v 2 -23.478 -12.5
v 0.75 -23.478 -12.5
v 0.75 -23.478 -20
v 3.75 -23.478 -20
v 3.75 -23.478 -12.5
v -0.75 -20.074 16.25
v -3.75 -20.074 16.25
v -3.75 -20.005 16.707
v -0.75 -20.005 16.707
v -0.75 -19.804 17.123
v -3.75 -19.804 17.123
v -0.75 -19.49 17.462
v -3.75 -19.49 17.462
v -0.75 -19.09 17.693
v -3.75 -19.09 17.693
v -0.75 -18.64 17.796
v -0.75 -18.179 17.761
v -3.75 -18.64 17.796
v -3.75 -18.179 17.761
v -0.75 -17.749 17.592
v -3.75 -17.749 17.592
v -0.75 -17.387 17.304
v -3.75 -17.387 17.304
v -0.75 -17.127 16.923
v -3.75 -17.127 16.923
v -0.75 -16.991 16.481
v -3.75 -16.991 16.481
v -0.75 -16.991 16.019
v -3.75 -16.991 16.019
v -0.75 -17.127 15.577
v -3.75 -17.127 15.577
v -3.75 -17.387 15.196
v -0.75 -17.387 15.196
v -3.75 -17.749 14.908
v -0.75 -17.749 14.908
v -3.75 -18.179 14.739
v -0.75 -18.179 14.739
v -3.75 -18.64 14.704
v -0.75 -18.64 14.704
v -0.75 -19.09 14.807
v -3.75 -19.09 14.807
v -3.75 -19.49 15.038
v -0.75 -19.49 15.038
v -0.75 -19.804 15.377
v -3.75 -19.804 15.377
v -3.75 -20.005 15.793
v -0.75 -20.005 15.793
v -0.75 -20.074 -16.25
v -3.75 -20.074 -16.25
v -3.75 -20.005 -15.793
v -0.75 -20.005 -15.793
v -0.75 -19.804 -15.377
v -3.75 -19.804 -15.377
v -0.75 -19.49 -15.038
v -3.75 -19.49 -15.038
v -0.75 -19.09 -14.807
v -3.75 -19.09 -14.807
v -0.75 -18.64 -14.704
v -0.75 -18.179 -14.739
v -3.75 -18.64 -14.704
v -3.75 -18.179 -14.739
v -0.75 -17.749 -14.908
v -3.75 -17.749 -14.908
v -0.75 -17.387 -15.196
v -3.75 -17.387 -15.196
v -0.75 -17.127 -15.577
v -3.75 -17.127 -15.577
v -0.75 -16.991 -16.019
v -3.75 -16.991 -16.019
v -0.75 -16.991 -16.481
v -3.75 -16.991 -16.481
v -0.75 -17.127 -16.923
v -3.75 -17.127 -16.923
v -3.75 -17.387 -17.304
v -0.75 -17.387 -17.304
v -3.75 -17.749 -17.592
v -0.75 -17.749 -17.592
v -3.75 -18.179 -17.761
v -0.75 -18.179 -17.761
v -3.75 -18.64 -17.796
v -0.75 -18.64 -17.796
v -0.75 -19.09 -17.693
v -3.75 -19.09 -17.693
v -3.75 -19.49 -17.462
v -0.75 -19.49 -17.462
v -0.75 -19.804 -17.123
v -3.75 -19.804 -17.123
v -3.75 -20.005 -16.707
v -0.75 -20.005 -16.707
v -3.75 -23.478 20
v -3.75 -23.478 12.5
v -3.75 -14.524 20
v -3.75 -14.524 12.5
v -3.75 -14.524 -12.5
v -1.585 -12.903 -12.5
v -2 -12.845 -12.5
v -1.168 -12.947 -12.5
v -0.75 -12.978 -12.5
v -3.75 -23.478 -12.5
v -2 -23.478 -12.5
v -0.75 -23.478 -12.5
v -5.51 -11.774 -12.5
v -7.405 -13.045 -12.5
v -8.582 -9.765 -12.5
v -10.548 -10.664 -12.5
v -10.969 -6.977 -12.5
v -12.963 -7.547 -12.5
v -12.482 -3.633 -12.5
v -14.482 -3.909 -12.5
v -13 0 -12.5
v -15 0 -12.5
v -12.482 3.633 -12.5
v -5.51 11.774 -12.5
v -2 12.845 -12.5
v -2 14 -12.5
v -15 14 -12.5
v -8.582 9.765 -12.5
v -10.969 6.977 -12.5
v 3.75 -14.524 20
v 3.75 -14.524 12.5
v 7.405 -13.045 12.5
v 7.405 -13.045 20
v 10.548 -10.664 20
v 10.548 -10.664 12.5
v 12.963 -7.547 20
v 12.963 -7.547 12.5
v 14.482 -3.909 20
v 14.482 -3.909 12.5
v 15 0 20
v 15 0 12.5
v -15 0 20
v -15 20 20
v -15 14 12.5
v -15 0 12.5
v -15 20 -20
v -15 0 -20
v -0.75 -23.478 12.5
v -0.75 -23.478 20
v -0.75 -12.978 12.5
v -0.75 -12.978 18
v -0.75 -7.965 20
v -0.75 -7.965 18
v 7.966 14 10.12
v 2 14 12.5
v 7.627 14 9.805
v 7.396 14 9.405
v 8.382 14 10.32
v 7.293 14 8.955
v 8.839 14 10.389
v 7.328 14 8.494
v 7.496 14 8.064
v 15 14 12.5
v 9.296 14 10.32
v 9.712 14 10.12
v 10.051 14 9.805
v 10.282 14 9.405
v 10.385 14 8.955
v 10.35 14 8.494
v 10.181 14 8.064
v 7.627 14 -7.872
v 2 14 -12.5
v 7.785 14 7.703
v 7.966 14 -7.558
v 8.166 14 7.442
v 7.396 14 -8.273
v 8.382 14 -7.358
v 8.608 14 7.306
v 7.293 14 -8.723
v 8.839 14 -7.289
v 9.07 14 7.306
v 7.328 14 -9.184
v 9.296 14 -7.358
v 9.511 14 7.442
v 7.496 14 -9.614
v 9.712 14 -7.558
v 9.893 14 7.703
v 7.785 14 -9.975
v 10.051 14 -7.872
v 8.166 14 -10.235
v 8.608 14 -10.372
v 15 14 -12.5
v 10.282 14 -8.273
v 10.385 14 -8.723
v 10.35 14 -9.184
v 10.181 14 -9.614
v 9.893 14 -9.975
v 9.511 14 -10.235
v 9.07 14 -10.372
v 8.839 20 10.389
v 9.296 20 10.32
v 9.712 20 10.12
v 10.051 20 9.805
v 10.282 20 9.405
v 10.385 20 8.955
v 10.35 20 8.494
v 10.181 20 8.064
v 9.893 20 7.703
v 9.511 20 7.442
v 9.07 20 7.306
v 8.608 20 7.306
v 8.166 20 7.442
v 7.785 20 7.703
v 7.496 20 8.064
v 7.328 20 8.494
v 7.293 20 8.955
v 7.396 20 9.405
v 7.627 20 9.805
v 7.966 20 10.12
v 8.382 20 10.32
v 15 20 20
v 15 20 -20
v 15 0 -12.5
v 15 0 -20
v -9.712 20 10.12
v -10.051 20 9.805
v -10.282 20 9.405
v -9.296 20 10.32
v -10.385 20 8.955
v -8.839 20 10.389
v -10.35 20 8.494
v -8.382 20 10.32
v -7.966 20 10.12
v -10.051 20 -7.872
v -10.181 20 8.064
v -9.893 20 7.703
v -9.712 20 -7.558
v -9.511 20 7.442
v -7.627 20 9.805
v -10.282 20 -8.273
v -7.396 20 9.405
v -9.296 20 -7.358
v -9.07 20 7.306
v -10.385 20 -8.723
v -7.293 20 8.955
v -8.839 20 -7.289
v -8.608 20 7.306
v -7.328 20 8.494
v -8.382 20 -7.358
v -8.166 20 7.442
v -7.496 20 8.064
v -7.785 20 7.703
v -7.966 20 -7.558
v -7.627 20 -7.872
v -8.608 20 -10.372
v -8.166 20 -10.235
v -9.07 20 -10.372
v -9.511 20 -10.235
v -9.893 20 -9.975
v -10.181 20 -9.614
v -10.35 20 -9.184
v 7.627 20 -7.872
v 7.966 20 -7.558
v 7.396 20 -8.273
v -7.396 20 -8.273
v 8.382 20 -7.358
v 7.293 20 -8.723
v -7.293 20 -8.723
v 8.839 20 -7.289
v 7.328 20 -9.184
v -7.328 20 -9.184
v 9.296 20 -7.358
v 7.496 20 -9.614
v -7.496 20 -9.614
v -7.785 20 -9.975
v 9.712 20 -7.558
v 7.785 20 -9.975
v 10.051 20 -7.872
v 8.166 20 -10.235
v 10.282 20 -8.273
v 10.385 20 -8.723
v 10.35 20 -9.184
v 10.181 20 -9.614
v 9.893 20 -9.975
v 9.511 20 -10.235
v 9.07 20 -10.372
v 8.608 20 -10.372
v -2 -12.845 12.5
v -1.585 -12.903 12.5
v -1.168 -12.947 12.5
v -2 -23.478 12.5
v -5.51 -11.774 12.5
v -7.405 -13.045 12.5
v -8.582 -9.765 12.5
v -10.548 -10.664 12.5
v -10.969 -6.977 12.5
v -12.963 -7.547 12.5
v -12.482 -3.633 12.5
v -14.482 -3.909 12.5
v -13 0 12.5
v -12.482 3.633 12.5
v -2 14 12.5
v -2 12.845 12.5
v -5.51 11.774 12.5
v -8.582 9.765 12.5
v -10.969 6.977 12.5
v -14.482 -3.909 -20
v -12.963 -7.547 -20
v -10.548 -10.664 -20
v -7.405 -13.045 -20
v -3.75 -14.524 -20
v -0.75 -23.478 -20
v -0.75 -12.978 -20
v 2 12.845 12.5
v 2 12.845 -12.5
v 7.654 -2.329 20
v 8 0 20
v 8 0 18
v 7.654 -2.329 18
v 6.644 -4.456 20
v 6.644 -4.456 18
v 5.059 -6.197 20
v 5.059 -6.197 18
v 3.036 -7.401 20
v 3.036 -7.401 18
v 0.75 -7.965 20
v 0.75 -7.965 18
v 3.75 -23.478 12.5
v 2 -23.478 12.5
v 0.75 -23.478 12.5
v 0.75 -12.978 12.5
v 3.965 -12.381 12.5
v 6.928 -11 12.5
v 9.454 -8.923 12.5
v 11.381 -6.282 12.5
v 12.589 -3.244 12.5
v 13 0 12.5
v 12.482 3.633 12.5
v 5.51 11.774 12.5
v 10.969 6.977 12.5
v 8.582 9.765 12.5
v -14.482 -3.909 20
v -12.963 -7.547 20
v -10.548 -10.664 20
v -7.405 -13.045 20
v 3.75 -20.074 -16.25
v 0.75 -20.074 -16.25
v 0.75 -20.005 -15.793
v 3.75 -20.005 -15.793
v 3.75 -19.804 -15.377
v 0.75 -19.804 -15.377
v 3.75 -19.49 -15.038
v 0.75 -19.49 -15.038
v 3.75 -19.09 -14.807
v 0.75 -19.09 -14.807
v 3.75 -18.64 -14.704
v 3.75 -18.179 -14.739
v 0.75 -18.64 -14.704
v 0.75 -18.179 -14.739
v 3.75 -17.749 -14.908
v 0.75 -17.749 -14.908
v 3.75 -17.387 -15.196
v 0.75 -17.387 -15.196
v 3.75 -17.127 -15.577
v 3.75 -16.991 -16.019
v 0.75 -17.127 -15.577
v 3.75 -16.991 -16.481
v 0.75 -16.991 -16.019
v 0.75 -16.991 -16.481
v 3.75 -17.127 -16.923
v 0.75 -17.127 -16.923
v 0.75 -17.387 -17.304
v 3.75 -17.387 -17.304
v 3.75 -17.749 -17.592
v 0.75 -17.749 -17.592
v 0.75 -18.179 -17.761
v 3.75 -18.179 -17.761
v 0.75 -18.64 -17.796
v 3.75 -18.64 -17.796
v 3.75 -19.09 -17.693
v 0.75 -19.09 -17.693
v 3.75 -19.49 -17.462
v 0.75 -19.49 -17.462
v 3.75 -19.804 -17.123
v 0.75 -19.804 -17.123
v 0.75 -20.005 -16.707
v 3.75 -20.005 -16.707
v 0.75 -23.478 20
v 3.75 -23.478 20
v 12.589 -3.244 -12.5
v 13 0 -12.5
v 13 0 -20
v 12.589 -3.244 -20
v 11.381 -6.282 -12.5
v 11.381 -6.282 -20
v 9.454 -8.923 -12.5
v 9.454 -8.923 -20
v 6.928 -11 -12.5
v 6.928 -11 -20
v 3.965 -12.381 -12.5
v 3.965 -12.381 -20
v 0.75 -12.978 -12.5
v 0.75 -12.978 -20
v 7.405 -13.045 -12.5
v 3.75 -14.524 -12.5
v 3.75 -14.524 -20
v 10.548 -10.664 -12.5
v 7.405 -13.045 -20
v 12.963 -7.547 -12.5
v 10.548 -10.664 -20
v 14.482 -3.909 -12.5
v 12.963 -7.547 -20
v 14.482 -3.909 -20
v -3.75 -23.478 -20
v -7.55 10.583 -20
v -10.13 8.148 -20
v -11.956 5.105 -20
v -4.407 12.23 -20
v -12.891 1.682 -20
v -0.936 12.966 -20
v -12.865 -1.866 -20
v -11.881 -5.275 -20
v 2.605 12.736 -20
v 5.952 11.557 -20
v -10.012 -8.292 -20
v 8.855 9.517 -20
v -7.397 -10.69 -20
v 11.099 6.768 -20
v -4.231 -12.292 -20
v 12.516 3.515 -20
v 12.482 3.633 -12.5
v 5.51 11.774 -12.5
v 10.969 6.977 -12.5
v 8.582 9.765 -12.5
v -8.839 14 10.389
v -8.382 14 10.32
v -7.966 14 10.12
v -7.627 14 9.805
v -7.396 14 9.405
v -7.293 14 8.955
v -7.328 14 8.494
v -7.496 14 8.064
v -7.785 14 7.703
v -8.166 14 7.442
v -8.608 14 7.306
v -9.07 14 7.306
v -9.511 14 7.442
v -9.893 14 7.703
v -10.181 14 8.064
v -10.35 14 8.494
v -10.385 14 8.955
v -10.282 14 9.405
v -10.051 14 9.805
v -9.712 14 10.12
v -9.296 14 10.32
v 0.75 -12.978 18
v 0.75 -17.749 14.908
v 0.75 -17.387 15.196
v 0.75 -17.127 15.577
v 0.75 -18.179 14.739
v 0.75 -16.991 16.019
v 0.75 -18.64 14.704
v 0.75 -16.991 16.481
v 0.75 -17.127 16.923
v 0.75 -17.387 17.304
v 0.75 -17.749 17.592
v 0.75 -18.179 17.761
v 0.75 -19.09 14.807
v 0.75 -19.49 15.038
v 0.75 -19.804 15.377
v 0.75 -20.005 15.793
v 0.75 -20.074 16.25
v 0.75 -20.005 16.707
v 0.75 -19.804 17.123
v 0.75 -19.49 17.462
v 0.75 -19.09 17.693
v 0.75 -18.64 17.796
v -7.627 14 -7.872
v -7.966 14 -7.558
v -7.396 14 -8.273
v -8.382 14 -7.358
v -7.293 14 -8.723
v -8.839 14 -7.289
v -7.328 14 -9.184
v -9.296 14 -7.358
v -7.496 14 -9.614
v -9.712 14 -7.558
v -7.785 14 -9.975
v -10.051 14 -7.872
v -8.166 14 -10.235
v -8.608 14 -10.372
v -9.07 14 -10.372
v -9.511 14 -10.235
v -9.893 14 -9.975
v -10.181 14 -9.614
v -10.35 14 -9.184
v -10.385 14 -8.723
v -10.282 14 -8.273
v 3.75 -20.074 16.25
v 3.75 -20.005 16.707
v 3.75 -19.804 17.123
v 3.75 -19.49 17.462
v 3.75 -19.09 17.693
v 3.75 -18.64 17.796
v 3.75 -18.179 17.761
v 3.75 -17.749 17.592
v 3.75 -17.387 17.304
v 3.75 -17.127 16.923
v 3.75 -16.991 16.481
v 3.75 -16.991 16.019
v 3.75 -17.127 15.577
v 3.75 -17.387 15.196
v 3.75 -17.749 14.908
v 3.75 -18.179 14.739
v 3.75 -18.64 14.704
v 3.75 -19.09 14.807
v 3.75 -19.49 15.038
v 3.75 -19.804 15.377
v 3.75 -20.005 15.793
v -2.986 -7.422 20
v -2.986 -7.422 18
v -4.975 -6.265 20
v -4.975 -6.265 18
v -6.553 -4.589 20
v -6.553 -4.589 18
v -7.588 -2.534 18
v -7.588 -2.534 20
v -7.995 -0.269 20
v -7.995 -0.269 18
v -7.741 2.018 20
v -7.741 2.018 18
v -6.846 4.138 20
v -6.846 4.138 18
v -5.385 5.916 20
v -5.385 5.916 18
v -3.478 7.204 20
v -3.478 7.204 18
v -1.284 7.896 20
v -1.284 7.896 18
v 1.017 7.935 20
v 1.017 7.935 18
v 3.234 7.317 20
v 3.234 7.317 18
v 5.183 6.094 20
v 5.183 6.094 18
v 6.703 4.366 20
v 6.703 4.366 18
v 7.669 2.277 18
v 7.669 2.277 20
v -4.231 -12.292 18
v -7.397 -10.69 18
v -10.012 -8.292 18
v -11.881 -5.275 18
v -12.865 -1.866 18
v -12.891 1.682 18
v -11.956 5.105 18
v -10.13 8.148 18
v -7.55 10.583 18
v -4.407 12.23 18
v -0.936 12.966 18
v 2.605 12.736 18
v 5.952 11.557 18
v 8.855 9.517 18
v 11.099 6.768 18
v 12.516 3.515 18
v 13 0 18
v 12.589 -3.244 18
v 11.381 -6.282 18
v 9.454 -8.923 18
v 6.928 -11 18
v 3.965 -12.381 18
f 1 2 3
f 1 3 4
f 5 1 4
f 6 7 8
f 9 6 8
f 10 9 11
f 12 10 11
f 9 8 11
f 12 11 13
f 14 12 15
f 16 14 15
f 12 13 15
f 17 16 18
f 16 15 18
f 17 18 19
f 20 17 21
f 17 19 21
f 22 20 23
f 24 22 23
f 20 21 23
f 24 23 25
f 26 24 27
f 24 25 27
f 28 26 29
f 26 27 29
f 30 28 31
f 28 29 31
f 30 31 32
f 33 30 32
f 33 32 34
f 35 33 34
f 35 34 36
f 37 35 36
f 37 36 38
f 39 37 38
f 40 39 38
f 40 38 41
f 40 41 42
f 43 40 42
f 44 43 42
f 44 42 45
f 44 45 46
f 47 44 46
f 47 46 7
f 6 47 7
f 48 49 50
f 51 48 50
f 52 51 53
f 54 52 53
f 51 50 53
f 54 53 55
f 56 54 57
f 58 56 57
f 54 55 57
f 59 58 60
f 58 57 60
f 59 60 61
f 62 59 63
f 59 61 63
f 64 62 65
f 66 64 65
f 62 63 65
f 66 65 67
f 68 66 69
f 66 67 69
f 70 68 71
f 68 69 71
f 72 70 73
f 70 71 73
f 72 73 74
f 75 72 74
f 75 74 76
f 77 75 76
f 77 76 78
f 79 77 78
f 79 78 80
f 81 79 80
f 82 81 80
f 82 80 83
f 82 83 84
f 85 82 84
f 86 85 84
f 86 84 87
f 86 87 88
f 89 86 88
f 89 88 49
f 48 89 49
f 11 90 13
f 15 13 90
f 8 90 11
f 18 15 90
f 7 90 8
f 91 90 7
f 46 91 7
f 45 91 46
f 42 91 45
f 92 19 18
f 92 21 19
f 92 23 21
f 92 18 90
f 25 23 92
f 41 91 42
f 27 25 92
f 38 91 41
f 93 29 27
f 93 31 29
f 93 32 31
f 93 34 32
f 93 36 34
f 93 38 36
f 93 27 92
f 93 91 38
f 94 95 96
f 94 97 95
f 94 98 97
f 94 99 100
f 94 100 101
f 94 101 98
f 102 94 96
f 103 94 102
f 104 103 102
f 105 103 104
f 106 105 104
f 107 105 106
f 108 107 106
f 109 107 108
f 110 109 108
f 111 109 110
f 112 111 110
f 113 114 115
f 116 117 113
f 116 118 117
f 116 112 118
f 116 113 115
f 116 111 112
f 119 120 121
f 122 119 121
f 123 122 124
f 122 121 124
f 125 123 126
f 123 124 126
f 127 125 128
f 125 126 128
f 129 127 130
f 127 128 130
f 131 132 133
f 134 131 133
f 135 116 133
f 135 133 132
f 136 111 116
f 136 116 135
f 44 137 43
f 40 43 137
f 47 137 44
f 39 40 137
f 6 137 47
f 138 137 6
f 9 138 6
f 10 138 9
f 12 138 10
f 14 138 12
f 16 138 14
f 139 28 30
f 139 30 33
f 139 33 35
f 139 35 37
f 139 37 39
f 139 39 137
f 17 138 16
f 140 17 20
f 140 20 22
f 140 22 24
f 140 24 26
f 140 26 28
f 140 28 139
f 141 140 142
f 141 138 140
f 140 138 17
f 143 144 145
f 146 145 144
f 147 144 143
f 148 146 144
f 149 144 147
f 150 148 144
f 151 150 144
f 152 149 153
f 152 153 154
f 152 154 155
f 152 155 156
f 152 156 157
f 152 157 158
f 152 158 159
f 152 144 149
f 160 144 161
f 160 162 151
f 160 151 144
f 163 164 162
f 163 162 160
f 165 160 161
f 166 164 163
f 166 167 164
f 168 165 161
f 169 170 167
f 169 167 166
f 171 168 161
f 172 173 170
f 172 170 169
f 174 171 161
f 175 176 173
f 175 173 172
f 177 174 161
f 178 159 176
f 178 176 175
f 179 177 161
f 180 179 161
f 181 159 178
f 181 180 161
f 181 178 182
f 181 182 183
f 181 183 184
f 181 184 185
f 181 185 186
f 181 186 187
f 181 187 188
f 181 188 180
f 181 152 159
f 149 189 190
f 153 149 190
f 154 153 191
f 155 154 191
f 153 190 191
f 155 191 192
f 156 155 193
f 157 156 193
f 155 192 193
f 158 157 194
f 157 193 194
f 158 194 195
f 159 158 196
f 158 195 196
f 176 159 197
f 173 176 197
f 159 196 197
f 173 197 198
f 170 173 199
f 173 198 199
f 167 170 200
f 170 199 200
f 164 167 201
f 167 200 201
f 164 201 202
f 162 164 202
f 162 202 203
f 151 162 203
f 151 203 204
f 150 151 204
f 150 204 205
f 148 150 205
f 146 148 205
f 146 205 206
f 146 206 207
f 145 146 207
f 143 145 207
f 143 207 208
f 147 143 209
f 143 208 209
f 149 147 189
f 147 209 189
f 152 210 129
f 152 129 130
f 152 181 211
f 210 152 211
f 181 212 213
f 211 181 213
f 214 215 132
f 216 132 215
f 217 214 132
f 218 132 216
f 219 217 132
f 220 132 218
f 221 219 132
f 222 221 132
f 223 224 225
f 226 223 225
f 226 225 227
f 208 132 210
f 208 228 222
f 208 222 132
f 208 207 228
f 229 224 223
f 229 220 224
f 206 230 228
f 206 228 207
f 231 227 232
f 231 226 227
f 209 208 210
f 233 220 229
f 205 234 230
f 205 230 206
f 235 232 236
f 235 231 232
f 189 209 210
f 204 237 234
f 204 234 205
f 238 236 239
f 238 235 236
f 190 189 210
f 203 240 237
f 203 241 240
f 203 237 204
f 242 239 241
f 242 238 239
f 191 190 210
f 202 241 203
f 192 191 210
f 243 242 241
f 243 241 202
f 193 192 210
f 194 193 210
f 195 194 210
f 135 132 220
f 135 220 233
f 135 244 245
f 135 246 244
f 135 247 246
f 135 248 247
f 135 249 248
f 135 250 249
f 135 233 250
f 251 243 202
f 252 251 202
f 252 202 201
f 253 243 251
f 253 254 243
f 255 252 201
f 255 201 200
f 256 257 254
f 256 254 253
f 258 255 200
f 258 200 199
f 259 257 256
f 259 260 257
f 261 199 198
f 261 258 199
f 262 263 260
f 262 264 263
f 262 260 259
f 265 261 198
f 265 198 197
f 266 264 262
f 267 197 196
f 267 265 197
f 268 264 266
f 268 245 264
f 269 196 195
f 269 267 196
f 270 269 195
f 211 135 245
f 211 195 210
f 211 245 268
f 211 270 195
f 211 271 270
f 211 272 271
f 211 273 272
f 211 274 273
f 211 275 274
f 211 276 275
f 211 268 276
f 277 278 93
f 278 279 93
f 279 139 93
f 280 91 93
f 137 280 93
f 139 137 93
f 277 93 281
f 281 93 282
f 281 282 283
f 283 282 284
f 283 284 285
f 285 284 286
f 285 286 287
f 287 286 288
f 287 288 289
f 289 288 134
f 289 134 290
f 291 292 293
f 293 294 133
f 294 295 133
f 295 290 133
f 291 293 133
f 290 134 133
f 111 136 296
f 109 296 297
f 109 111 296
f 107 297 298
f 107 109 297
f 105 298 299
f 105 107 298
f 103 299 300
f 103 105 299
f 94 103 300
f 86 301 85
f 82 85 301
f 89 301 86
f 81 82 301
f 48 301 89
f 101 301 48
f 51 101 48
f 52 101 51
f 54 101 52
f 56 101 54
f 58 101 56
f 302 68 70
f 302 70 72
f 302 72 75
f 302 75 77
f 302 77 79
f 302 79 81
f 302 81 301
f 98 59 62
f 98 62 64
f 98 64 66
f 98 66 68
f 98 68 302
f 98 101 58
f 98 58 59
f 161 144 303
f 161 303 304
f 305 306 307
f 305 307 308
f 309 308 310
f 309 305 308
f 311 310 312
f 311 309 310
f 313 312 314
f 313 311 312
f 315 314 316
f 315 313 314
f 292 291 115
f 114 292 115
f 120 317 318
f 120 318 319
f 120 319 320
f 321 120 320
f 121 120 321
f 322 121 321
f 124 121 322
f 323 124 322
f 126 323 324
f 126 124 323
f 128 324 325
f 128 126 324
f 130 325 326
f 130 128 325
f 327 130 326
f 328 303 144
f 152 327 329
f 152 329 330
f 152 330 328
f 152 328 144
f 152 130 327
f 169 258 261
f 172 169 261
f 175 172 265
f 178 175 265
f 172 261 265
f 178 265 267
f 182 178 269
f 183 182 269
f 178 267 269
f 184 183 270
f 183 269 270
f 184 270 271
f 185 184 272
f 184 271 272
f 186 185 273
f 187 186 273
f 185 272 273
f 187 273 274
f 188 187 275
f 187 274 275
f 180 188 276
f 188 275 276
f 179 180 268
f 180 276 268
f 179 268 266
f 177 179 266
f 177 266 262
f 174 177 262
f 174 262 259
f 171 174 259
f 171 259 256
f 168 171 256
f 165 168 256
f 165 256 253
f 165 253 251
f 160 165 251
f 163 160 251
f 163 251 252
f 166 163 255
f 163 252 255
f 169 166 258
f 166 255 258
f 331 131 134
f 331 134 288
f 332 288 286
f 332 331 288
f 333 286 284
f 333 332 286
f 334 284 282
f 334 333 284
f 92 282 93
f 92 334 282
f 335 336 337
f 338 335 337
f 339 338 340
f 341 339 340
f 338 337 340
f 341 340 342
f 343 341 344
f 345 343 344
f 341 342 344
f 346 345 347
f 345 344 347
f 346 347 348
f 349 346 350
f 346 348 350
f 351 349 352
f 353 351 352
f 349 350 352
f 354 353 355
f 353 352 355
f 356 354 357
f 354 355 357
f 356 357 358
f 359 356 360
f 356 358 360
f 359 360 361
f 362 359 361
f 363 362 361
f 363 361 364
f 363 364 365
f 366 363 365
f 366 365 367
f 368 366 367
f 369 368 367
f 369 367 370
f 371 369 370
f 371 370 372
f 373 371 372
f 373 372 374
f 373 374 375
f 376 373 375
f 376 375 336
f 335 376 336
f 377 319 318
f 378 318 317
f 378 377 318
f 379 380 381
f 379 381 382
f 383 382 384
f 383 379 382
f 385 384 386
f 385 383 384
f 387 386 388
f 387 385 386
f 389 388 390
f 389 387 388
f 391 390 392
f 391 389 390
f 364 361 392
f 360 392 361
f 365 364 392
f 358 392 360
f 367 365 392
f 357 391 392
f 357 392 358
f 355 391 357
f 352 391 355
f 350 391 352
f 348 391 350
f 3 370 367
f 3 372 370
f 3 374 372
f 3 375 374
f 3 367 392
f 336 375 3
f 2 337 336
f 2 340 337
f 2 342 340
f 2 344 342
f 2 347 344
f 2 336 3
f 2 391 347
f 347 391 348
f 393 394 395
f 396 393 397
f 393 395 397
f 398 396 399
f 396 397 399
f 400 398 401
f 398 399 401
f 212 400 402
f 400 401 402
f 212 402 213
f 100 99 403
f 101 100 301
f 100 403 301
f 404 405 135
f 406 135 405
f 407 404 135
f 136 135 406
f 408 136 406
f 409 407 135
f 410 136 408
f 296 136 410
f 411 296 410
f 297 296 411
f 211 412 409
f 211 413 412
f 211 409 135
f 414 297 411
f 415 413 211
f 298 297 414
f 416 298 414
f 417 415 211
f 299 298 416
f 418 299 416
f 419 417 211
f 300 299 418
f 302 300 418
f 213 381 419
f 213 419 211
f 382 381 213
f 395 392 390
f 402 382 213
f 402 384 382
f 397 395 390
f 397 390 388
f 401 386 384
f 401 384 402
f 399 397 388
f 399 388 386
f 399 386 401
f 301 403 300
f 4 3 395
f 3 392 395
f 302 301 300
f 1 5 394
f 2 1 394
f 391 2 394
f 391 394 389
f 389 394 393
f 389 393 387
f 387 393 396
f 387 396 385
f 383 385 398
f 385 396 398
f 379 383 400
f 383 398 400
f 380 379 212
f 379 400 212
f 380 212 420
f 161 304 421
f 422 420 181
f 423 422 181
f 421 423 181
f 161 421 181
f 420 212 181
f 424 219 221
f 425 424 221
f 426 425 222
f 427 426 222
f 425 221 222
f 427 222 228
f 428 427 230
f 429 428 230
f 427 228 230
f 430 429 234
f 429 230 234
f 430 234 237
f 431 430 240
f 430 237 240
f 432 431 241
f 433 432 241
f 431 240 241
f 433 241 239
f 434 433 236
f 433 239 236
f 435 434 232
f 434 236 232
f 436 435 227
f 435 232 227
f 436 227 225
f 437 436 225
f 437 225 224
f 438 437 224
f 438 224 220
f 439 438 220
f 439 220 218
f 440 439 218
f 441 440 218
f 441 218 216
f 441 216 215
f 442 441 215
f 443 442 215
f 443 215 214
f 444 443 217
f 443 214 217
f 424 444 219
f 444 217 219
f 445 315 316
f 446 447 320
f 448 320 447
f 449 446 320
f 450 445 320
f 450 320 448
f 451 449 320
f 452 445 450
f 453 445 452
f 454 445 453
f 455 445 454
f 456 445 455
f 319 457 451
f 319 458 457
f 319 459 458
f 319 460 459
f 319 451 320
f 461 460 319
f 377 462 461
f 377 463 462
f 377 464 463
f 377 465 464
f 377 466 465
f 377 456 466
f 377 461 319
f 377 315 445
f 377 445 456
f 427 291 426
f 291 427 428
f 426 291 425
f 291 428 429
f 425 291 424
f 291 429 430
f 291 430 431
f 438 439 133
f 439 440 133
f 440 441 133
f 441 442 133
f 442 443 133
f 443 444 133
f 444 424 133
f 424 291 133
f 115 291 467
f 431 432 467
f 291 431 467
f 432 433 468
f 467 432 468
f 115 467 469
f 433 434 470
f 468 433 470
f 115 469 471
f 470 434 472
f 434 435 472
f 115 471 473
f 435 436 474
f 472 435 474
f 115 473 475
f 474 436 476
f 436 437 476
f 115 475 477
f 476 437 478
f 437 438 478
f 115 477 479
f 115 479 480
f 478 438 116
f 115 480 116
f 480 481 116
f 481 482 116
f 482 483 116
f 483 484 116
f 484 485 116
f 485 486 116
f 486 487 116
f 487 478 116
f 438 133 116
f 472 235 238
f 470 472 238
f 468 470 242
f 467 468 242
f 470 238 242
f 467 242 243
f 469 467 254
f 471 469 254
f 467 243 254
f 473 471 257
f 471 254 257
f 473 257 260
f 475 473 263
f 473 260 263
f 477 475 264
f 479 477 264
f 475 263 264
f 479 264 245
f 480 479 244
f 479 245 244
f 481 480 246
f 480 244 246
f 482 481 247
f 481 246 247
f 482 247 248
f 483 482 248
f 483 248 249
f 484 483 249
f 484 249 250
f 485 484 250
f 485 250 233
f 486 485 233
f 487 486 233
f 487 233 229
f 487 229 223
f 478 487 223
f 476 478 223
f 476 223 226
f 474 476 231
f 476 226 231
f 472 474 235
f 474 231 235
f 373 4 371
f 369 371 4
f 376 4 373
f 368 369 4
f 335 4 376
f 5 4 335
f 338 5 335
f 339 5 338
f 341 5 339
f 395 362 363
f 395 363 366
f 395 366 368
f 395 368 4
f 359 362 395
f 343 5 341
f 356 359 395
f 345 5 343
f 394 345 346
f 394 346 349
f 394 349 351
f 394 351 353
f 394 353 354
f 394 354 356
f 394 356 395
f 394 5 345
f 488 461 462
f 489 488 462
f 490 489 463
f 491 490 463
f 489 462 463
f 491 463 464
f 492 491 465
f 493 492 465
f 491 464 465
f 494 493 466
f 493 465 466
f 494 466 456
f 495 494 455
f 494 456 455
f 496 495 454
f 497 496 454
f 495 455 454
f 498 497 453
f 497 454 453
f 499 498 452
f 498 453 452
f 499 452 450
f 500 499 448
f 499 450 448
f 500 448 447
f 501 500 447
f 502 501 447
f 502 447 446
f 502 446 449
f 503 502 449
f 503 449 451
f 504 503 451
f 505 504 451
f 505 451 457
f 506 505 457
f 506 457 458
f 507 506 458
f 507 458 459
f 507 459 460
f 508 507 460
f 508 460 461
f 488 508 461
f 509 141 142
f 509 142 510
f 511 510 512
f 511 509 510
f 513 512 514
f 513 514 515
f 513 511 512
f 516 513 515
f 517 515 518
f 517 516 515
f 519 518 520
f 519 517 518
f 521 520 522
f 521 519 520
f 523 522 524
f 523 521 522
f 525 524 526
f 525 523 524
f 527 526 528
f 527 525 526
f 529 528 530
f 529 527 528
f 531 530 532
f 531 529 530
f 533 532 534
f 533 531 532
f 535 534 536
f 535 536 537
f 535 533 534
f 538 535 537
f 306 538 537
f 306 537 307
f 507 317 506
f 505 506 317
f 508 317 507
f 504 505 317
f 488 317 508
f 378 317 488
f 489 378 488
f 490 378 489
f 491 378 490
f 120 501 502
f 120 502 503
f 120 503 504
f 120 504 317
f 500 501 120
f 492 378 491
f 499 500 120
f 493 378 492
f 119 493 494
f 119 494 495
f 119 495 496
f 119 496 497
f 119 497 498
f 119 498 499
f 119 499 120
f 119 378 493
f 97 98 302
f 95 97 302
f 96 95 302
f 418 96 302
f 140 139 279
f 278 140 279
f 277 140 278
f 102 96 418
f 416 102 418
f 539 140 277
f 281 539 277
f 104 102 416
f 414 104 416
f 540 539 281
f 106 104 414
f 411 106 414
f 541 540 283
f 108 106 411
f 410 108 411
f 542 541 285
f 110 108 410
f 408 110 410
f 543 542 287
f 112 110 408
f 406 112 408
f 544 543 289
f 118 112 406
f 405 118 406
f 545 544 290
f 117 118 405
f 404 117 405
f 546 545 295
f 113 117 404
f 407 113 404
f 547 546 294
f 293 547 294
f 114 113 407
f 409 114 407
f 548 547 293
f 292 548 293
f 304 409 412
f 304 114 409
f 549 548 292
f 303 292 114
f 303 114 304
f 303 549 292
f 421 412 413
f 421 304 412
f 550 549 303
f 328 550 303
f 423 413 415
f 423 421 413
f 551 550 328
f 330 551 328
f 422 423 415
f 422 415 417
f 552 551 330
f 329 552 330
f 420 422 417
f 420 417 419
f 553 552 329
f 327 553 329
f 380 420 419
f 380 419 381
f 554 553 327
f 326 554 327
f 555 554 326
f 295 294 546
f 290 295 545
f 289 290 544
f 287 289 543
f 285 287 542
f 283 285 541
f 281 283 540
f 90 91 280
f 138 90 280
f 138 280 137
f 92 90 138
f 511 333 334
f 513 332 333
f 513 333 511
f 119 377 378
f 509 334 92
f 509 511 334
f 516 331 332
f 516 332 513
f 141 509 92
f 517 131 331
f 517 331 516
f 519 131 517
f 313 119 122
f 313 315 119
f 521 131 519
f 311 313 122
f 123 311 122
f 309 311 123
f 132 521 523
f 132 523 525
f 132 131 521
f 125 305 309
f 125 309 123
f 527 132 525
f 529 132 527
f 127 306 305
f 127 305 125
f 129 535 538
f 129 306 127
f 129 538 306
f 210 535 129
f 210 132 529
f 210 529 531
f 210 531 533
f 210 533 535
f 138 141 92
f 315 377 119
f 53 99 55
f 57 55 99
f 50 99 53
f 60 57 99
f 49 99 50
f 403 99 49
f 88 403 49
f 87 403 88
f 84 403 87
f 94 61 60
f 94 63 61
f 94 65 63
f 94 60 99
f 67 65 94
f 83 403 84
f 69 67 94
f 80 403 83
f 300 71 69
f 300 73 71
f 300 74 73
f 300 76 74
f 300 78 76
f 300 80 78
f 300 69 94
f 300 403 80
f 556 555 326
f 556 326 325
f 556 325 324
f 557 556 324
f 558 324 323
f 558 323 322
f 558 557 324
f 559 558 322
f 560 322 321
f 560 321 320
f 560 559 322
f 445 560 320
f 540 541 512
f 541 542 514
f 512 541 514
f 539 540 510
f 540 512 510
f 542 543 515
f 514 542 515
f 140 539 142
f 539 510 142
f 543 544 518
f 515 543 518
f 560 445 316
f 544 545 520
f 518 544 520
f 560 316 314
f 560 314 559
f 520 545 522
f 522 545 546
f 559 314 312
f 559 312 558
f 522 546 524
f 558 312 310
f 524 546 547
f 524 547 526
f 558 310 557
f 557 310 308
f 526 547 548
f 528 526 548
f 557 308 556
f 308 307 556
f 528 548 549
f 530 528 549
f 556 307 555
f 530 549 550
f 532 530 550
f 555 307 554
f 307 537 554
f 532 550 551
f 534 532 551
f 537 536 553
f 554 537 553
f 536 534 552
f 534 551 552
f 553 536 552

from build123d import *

# Parameters (mm, degrees)
BOSS_EXTRUDE1_DEPTH   = 20
SKETCH2_W             = 3
SKETCH2_H             = 10.5
BOSS_EXTRUDE2_DEPTH   = 20
SKETCH4_W             = 30
SKETCH4_H             = 40
BOSS_EXTRUDE3_DEPTH   = 5
SKETCH5_W             = 25
SKETCH5_H             = 37.478347352
CUT_EXTRUDE2_DEPTH    = 13
SKETCH6_R             = 1.55
MOTORMOUNTHOLES_DEPTH = 6
CLAMPHOLES_REACH      = 38.094
SKETCH8_R             = 1.55
ENDSTOPPER_DEPTH      = 2
CUT_EXTRUDE7_START    = -15
SKETCH10_W            = 25
SKETCH10_H            = 37.478347352
CUT_EXTRUDE7_DEPTH    = 13
SKETCH11_W            = 25
SKETCH11_H            = 10.633114773
CUT_EXTRUDE8_DEPTH    = 4


with BuildPart() as part:
    # Sketch1 → Boss-Extrude1 (new, symmetric)
    with BuildSketch(Plane.XY):
        with BuildLine():
            Line((-15, 15), (-15, 0))
            ThreePointArc((-15, 0), (-10.606601721, 10.606601715), (-8e-09, 15))
            Line((-8e-09, 15), (-15, 15))
        make_face()
        with BuildLine():
            Line((15, 15), (-8e-09, 15))
            ThreePointArc((-8e-09, 15), (10.606601715, 10.606601721), (15, 0))
            Line((15, 0), (15, 15))
        make_face()
        with BuildLine():
            ThreePointArc((-8e-09, 15), (-10.606601721, 10.606601715), (-15, 0))
            ThreePointArc((-15, 0), (-10.86853256, -10.338036564), (-0.75, -14.981238267))
            Line((-0.75, -14.981238267), (-0.75, -12.978347352))
            ThreePointArc((-0.75, -12.978347352), (-8.923284149, 9.453835201), (13, 0))
            ThreePointArc((13, 0), (9.453835201, -8.923284149), (0.75, -12.978347352))
            Line((0.75, -12.978347352), (0.75, -14.981238267))
            ThreePointArc((0.75, -14.981238267), (10.86853256, -10.338036564), (15, 0))
            ThreePointArc((15, 0), (10.606601715, 10.606601721), (-8e-09, 15))
        make_face()
    extrude(amount=BOSS_EXTRUDE1_DEPTH, both=True)

    # Sketch2 → Boss-Extrude2 (add, symmetric)
    with BuildSketch(Plane.XY):
        with Locations((-2.25, -18.228347352)):
            Rectangle(SKETCH2_W, SKETCH2_H)
        with Locations((2.25, -18.228347352)):
            Rectangle(SKETCH2_W, SKETCH2_H)
    extrude(amount=BOSS_EXTRUDE2_DEPTH, both=True)

    # Sketch4 → Boss-Extrude3 (add)
    with BuildSketch(Plane(origin=(0, 15, 0), x_dir=(1, 0, 0), z_dir=(0, 1, 0))):
        Rectangle(SKETCH4_W, SKETCH4_H)
    extrude(amount=BOSS_EXTRUDE3_DEPTH)

    # Sketch5 → Cut-Extrude2 (cut)
    with BuildSketch(Plane(origin=(15, 0, 0), x_dir=(0, 0, -1), z_dir=(1, 0, 0))):
        with Locations((0, -4.739173676)):
            Rectangle(SKETCH5_W, SKETCH5_H)
    extrude(amount=-CUT_EXTRUDE2_DEPTH, mode=Mode.SUBTRACT)

    # Sketch6 → MotorMountHoles (cut)
    with BuildSketch(Plane(origin=(0, 20, 0), x_dir=(1, 0, 0), z_dir=(0, 1, 0))):
        with Locations(Location((-8.838834765, 8.838834765, 0), (0, 0, 270))):
            Circle(SKETCH6_R)
        with Locations(Location((8.838834765, 8.838834765, 0), (0, 0, 270))):
            Circle(SKETCH6_R)
        with Locations(Location((8.838834765, -8.838834765, 0), (0, 0, 270))):
            Circle(SKETCH6_R)
        with Locations(Location((-8.838834765, -8.838834765, 0), (0, 0, 270))):
            Circle(SKETCH6_R)
    extrude(amount=-MOTORMOUNTHOLES_DEPTH, mode=Mode.SUBTRACT)

    # ClampHoles: up to this face of the body (flat: up to its plane)
    clampholes_end = Plane(part.part.faces().sort_by_distance((3.75, -19.00101745, 16.25))[0])
    # Sketch8 → ClampHoles (cut, up to the picked face)
    with BuildSketch(Plane.ZY.offset(3.75), mode=Mode.PRIVATE) as clampholes_sk1:
        with Locations(Location((16.25, -18.523687548, 0), (0, 0, 270))):
            Circle(SKETCH8_R)
    clampholes_tool1 = split(extrude(clampholes_sk1.sketch, amount=-CLAMPHOLES_REACH, mode=Mode.PRIVATE), bisect_by=clampholes_end, keep=Keep.BOTH, mode=Mode.PRIVATE)
    # Sketch8 → ClampHoles (cut, up to the picked face)
    with BuildSketch(Plane.ZY.offset(3.75), mode=Mode.PRIVATE) as clampholes_sk2:
        with Locations(Location((-16.25, -18.523687548, 0), (0, 0, 270))):
            Circle(SKETCH8_R)
    clampholes_tool2 = split(extrude(clampholes_sk2.sketch, amount=-CLAMPHOLES_REACH, mode=Mode.PRIVATE), bisect_by=clampholes_end, keep=Keep.BOTH, mode=Mode.PRIVATE)
    add(clampholes_tool1.solids().sort_by(Axis((-3.75, -18.523688, 16.25), (1, 0, 0)))[0], mode=Mode.SUBTRACT)
    add(clampholes_tool2.solids().sort_by(Axis((-3.75, -18.523688, -16.25), (1, 0, 0)))[0], mode=Mode.SUBTRACT)

    # Sketch9 → EndStopper (add)
    with BuildSketch(Plane.XY.offset(20)):
        with BuildLine():
            ThreePointArc((13, 0), (-8.923284149, 9.453835201), (-0.75, -12.978347352))
            Line((-0.75, -12.978347352), (-0.75, -7.964766161))
            ThreePointArc((-0.75, -7.964766161), (-5.385164807, 5.916079783), (8, 0))
            ThreePointArc((8, 0), (5.916079783, -5.385164807), (0.75, -7.964766161))
            Line((0.75, -7.964766161), (0.75, -12.978347352))
            ThreePointArc((0.75, -12.978347352), (9.453835201, -8.923284149), (13, 0))
        make_face()
    extrude(amount=-ENDSTOPPER_DEPTH)

    # Sketch10 → Cut-Extrude7 (cut)
    with BuildSketch(Plane(origin=(0, 0, 0), x_dir=(0, 0, -1), z_dir=(1, 0, 0)).offset(CUT_EXTRUDE7_START)):
        with Locations((0, -4.739173676)):
            Rectangle(SKETCH10_W, SKETCH10_H)
    extrude(amount=CUT_EXTRUDE7_DEPTH, mode=Mode.SUBTRACT)

    # Sketch11 → Cut-Extrude8 (cut)
    with BuildSketch(Plane.ZY.offset(2)):
        with Locations((0, -18.161789965)):
            Rectangle(SKETCH11_W, SKETCH11_H)
    extrude(amount=-CUT_EXTRUDE8_DEPTH, mode=Mode.SUBTRACT)


solid = part.part
